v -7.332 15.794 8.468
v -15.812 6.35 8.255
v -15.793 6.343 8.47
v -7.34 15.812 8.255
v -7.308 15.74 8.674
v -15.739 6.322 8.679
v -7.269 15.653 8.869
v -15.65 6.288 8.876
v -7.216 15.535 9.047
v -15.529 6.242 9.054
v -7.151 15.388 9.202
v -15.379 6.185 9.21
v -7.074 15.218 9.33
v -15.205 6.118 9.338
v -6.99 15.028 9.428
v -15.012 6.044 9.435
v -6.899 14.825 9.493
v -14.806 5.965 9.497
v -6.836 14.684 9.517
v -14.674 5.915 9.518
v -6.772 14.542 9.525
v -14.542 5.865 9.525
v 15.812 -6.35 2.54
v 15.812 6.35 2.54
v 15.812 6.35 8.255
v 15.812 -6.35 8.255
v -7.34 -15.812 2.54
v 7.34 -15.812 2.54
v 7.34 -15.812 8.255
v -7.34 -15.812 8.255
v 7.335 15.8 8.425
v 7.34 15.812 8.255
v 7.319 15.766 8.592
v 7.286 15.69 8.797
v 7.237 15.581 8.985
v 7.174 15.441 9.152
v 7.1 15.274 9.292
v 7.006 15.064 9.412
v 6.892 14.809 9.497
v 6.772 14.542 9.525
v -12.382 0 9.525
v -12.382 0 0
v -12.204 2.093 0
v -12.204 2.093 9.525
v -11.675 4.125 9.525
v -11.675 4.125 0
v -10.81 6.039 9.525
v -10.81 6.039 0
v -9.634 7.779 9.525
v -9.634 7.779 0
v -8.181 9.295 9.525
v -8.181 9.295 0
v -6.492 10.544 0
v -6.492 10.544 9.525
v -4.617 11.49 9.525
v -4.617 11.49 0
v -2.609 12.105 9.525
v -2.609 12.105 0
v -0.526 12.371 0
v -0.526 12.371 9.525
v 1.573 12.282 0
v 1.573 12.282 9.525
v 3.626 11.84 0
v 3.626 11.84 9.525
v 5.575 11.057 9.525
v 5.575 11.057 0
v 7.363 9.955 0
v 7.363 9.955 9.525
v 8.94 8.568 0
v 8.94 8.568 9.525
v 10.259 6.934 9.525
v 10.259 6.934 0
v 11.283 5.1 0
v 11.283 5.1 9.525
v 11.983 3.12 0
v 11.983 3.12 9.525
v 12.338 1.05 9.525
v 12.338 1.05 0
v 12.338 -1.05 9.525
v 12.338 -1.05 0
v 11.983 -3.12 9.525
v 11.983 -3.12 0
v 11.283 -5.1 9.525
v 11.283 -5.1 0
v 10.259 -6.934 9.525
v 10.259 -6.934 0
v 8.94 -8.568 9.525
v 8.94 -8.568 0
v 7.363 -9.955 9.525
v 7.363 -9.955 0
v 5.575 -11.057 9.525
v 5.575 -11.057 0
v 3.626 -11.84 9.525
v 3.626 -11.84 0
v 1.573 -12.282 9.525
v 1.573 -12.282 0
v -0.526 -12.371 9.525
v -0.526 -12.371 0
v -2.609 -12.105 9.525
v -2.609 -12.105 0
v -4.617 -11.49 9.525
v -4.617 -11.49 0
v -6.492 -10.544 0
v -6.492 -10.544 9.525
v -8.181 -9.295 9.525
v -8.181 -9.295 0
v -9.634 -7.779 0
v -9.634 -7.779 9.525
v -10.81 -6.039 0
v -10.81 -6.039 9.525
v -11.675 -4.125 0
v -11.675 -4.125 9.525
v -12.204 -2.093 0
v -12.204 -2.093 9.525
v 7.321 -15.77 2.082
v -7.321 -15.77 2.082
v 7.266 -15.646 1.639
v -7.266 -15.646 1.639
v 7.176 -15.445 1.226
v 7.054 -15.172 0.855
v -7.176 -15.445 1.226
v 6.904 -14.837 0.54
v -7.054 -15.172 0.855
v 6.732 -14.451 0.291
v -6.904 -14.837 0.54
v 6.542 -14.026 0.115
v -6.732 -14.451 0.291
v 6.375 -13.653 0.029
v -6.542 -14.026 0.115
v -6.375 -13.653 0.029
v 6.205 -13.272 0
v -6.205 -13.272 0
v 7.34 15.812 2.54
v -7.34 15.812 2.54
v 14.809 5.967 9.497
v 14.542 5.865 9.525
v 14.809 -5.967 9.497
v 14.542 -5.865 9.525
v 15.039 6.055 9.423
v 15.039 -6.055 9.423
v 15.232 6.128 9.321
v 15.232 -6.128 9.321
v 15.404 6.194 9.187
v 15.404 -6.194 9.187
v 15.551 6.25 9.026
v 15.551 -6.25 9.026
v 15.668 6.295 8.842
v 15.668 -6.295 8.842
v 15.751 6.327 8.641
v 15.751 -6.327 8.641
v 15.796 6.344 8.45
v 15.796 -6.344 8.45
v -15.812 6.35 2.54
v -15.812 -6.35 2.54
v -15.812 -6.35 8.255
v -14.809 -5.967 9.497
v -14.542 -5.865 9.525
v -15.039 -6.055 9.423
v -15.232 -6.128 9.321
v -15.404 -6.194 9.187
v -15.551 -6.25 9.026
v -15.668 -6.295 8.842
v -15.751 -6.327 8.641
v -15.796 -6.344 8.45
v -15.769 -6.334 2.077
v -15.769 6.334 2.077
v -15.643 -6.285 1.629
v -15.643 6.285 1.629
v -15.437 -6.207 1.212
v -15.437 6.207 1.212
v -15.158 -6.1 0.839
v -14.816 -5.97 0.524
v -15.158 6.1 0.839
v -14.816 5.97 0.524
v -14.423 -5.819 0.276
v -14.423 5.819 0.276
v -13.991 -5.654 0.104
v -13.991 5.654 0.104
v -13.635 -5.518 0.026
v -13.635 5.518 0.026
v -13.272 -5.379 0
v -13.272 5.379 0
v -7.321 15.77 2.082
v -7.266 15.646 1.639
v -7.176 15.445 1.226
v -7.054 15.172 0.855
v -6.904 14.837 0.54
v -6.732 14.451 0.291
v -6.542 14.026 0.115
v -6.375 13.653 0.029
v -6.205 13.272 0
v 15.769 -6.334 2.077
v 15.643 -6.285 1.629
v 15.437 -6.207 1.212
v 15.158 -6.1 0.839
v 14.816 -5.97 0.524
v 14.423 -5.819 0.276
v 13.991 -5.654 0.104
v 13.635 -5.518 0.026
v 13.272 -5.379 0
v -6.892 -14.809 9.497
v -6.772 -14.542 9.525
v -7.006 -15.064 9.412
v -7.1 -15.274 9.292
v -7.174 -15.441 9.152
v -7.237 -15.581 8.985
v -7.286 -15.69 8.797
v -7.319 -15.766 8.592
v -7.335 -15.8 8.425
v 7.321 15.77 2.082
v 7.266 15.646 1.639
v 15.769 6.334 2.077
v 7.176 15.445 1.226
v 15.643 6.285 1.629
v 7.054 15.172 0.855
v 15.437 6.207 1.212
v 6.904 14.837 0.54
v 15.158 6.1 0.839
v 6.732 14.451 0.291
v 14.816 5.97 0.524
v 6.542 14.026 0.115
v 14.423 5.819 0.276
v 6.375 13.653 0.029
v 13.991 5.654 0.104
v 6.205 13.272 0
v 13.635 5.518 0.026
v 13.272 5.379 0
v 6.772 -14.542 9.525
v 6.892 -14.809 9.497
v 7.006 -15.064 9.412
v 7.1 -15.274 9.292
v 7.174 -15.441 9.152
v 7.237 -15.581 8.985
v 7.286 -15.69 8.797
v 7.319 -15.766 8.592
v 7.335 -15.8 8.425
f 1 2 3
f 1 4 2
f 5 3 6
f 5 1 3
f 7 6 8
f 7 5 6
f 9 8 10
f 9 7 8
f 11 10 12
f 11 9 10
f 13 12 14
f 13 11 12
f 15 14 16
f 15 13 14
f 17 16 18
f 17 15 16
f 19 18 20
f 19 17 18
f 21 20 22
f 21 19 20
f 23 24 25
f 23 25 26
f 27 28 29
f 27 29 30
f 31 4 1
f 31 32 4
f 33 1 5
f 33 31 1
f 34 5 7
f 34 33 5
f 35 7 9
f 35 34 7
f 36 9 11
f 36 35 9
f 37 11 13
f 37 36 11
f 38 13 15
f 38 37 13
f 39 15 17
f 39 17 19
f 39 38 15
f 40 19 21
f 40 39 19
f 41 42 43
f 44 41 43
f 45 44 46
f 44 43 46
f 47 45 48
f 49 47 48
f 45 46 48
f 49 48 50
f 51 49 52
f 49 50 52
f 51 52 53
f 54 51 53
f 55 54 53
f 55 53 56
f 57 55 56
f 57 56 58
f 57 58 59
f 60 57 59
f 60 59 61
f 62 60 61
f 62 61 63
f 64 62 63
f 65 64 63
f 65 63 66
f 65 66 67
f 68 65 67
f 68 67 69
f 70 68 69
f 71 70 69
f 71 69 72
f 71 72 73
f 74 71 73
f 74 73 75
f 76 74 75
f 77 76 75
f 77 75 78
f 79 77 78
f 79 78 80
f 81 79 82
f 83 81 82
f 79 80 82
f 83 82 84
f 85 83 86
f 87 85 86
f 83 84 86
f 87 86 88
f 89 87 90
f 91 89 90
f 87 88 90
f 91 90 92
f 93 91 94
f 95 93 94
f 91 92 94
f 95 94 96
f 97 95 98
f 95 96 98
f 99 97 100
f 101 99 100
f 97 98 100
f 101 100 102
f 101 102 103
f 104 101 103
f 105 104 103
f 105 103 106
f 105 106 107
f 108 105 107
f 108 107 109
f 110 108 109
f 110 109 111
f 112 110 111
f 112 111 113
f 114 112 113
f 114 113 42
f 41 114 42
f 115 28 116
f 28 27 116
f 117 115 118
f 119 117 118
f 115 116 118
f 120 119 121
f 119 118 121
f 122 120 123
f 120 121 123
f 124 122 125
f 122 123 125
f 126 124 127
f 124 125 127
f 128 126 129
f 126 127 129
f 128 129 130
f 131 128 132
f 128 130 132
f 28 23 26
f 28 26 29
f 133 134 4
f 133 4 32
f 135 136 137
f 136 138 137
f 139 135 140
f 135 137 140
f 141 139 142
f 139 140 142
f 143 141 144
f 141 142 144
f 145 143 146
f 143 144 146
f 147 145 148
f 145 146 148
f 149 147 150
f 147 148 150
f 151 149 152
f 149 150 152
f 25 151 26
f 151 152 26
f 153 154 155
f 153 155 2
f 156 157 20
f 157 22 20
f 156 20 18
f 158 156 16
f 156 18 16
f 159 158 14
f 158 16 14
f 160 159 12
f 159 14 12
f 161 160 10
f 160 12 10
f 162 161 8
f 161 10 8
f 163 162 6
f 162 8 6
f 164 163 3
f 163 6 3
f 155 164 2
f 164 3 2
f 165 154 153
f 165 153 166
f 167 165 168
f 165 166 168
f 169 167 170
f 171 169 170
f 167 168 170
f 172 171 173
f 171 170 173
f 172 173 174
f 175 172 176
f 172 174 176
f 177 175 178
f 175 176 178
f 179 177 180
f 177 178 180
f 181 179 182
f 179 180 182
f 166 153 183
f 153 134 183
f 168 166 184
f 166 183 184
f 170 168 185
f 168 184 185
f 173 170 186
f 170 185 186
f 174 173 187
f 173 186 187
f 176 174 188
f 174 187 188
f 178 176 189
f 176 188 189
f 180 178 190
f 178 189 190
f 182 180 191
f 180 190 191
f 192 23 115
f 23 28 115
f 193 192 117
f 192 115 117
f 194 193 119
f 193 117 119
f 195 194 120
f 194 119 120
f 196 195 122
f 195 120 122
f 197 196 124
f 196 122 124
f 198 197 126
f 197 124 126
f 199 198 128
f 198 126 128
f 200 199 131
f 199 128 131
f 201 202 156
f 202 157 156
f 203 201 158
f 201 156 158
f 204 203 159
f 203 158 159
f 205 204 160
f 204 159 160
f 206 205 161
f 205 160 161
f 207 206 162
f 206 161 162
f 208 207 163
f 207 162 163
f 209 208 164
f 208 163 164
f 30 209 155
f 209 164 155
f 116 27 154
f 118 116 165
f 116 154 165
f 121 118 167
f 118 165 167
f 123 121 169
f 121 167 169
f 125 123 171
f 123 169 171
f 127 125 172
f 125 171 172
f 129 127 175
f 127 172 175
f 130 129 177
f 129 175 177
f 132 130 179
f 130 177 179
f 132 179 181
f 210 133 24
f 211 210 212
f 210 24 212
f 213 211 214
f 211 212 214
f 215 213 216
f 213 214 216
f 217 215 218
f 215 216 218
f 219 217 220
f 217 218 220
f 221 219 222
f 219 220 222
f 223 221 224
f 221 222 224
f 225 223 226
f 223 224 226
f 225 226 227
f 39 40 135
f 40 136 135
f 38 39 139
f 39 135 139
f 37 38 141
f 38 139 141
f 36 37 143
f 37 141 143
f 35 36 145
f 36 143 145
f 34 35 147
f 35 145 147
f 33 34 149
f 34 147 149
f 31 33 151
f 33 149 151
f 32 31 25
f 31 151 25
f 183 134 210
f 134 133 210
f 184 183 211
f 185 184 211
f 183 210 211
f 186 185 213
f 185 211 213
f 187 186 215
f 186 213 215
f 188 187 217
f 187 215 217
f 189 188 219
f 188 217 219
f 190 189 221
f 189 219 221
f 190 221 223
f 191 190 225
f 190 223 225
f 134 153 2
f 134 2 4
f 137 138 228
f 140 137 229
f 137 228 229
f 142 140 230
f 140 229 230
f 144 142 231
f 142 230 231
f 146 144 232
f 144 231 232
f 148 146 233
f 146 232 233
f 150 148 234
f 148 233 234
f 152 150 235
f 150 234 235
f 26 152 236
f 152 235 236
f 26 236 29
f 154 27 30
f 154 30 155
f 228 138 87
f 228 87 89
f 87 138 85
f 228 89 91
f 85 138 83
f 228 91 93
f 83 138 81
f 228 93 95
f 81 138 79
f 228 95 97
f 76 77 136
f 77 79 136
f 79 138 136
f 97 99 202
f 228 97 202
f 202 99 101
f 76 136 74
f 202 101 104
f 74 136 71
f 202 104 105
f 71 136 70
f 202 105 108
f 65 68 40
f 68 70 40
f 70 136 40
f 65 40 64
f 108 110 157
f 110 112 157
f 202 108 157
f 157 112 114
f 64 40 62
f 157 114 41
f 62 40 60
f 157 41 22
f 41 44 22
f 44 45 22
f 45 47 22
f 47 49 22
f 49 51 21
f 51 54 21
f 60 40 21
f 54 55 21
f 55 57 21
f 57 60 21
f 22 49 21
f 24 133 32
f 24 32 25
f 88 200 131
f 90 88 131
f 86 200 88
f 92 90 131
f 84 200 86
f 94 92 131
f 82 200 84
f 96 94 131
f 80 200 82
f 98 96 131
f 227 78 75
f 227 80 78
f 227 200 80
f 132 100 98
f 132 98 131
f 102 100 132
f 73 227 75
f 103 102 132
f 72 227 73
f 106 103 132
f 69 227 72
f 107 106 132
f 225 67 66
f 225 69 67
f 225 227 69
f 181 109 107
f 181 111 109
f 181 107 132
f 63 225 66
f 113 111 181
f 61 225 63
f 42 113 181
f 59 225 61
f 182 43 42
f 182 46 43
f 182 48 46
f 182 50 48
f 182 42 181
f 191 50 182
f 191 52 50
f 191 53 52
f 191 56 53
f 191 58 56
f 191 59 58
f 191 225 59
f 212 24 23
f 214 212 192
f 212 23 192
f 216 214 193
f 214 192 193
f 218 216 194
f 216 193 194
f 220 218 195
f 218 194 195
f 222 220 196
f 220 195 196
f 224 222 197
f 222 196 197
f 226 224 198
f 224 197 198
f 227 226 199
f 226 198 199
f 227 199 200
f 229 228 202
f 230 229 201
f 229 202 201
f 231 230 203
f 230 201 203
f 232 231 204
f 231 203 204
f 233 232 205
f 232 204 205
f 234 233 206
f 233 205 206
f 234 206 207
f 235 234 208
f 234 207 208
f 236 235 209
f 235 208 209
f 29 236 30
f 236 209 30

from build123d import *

# Parameters (mm, degrees)
BOSS_EXTRUDE1_DEPTH = 9.525
FILLET1_R           = 2.54
SKETCH2_R           = 12.3825
CUT_EXTRUDE1_DEPTH  = 10.525
FILLET2_R           = 1.27


with BuildPart() as part:
    # Sketch1 → Boss-Extrude1 (new body)
    with BuildSketch(Plane.XY):
        Polygon((-7.339781299, 15.8115), (7.339781299, 15.8115), (15.8115, 6.35), (15.8115, -6.35), (7.339781299, -15.8115), (-7.339781299, -15.8115), (-15.8115, -6.35), (-15.8115, 6.35), align=None)
    extrude(amount=BOSS_EXTRUDE1_DEPTH)

    # Fillet1
    fillet1_edges = [part.edges().sort_by_distance(p)[0] for p in [
        (15.8115, 0, 0),
        (11.575640649, -11.08075, 0),
        (0, -15.8115, 0),
        (-11.575640649, -11.08075, 0),
        (-15.8115, 0, 0),
        (-11.575640649, 11.08075, 0),
        (0, 15.8115, 0),
        (11.575640649, 11.08075, 0),
    ]]
    fillet(fillet1_edges, radius=FILLET1_R)

    # Sketch2 → Cut-Extrude1 (cut, through all)
    with BuildSketch(Plane(origin=(0, 0, 0), x_dir=(-1, 0, 0), z_dir=(0, 0, -1))):
        Circle(SKETCH2_R)
    extrude(amount=-CUT_EXTRUDE1_DEPTH, mode=Mode.SUBTRACT)

    # Fillet2
    fillet2_edges = [part.edges().sort_by_distance(p)[0] for p in [
        (11.575640649, -11.08075, 9.525),
        (15.8115, 0, 9.525),
        (11.575640649, 11.08075, 9.525),
        (0, 15.8115, 9.525),
        (-11.575640649, 11.08075, 9.525),
        (-15.8115, 0, 9.525),
        (-11.575640649, -11.08075, 9.525),
        (0, -15.8115, 9.525),
    ]]
    fillet(fillet2_edges, radius=FILLET2_R)


solid = part.part
